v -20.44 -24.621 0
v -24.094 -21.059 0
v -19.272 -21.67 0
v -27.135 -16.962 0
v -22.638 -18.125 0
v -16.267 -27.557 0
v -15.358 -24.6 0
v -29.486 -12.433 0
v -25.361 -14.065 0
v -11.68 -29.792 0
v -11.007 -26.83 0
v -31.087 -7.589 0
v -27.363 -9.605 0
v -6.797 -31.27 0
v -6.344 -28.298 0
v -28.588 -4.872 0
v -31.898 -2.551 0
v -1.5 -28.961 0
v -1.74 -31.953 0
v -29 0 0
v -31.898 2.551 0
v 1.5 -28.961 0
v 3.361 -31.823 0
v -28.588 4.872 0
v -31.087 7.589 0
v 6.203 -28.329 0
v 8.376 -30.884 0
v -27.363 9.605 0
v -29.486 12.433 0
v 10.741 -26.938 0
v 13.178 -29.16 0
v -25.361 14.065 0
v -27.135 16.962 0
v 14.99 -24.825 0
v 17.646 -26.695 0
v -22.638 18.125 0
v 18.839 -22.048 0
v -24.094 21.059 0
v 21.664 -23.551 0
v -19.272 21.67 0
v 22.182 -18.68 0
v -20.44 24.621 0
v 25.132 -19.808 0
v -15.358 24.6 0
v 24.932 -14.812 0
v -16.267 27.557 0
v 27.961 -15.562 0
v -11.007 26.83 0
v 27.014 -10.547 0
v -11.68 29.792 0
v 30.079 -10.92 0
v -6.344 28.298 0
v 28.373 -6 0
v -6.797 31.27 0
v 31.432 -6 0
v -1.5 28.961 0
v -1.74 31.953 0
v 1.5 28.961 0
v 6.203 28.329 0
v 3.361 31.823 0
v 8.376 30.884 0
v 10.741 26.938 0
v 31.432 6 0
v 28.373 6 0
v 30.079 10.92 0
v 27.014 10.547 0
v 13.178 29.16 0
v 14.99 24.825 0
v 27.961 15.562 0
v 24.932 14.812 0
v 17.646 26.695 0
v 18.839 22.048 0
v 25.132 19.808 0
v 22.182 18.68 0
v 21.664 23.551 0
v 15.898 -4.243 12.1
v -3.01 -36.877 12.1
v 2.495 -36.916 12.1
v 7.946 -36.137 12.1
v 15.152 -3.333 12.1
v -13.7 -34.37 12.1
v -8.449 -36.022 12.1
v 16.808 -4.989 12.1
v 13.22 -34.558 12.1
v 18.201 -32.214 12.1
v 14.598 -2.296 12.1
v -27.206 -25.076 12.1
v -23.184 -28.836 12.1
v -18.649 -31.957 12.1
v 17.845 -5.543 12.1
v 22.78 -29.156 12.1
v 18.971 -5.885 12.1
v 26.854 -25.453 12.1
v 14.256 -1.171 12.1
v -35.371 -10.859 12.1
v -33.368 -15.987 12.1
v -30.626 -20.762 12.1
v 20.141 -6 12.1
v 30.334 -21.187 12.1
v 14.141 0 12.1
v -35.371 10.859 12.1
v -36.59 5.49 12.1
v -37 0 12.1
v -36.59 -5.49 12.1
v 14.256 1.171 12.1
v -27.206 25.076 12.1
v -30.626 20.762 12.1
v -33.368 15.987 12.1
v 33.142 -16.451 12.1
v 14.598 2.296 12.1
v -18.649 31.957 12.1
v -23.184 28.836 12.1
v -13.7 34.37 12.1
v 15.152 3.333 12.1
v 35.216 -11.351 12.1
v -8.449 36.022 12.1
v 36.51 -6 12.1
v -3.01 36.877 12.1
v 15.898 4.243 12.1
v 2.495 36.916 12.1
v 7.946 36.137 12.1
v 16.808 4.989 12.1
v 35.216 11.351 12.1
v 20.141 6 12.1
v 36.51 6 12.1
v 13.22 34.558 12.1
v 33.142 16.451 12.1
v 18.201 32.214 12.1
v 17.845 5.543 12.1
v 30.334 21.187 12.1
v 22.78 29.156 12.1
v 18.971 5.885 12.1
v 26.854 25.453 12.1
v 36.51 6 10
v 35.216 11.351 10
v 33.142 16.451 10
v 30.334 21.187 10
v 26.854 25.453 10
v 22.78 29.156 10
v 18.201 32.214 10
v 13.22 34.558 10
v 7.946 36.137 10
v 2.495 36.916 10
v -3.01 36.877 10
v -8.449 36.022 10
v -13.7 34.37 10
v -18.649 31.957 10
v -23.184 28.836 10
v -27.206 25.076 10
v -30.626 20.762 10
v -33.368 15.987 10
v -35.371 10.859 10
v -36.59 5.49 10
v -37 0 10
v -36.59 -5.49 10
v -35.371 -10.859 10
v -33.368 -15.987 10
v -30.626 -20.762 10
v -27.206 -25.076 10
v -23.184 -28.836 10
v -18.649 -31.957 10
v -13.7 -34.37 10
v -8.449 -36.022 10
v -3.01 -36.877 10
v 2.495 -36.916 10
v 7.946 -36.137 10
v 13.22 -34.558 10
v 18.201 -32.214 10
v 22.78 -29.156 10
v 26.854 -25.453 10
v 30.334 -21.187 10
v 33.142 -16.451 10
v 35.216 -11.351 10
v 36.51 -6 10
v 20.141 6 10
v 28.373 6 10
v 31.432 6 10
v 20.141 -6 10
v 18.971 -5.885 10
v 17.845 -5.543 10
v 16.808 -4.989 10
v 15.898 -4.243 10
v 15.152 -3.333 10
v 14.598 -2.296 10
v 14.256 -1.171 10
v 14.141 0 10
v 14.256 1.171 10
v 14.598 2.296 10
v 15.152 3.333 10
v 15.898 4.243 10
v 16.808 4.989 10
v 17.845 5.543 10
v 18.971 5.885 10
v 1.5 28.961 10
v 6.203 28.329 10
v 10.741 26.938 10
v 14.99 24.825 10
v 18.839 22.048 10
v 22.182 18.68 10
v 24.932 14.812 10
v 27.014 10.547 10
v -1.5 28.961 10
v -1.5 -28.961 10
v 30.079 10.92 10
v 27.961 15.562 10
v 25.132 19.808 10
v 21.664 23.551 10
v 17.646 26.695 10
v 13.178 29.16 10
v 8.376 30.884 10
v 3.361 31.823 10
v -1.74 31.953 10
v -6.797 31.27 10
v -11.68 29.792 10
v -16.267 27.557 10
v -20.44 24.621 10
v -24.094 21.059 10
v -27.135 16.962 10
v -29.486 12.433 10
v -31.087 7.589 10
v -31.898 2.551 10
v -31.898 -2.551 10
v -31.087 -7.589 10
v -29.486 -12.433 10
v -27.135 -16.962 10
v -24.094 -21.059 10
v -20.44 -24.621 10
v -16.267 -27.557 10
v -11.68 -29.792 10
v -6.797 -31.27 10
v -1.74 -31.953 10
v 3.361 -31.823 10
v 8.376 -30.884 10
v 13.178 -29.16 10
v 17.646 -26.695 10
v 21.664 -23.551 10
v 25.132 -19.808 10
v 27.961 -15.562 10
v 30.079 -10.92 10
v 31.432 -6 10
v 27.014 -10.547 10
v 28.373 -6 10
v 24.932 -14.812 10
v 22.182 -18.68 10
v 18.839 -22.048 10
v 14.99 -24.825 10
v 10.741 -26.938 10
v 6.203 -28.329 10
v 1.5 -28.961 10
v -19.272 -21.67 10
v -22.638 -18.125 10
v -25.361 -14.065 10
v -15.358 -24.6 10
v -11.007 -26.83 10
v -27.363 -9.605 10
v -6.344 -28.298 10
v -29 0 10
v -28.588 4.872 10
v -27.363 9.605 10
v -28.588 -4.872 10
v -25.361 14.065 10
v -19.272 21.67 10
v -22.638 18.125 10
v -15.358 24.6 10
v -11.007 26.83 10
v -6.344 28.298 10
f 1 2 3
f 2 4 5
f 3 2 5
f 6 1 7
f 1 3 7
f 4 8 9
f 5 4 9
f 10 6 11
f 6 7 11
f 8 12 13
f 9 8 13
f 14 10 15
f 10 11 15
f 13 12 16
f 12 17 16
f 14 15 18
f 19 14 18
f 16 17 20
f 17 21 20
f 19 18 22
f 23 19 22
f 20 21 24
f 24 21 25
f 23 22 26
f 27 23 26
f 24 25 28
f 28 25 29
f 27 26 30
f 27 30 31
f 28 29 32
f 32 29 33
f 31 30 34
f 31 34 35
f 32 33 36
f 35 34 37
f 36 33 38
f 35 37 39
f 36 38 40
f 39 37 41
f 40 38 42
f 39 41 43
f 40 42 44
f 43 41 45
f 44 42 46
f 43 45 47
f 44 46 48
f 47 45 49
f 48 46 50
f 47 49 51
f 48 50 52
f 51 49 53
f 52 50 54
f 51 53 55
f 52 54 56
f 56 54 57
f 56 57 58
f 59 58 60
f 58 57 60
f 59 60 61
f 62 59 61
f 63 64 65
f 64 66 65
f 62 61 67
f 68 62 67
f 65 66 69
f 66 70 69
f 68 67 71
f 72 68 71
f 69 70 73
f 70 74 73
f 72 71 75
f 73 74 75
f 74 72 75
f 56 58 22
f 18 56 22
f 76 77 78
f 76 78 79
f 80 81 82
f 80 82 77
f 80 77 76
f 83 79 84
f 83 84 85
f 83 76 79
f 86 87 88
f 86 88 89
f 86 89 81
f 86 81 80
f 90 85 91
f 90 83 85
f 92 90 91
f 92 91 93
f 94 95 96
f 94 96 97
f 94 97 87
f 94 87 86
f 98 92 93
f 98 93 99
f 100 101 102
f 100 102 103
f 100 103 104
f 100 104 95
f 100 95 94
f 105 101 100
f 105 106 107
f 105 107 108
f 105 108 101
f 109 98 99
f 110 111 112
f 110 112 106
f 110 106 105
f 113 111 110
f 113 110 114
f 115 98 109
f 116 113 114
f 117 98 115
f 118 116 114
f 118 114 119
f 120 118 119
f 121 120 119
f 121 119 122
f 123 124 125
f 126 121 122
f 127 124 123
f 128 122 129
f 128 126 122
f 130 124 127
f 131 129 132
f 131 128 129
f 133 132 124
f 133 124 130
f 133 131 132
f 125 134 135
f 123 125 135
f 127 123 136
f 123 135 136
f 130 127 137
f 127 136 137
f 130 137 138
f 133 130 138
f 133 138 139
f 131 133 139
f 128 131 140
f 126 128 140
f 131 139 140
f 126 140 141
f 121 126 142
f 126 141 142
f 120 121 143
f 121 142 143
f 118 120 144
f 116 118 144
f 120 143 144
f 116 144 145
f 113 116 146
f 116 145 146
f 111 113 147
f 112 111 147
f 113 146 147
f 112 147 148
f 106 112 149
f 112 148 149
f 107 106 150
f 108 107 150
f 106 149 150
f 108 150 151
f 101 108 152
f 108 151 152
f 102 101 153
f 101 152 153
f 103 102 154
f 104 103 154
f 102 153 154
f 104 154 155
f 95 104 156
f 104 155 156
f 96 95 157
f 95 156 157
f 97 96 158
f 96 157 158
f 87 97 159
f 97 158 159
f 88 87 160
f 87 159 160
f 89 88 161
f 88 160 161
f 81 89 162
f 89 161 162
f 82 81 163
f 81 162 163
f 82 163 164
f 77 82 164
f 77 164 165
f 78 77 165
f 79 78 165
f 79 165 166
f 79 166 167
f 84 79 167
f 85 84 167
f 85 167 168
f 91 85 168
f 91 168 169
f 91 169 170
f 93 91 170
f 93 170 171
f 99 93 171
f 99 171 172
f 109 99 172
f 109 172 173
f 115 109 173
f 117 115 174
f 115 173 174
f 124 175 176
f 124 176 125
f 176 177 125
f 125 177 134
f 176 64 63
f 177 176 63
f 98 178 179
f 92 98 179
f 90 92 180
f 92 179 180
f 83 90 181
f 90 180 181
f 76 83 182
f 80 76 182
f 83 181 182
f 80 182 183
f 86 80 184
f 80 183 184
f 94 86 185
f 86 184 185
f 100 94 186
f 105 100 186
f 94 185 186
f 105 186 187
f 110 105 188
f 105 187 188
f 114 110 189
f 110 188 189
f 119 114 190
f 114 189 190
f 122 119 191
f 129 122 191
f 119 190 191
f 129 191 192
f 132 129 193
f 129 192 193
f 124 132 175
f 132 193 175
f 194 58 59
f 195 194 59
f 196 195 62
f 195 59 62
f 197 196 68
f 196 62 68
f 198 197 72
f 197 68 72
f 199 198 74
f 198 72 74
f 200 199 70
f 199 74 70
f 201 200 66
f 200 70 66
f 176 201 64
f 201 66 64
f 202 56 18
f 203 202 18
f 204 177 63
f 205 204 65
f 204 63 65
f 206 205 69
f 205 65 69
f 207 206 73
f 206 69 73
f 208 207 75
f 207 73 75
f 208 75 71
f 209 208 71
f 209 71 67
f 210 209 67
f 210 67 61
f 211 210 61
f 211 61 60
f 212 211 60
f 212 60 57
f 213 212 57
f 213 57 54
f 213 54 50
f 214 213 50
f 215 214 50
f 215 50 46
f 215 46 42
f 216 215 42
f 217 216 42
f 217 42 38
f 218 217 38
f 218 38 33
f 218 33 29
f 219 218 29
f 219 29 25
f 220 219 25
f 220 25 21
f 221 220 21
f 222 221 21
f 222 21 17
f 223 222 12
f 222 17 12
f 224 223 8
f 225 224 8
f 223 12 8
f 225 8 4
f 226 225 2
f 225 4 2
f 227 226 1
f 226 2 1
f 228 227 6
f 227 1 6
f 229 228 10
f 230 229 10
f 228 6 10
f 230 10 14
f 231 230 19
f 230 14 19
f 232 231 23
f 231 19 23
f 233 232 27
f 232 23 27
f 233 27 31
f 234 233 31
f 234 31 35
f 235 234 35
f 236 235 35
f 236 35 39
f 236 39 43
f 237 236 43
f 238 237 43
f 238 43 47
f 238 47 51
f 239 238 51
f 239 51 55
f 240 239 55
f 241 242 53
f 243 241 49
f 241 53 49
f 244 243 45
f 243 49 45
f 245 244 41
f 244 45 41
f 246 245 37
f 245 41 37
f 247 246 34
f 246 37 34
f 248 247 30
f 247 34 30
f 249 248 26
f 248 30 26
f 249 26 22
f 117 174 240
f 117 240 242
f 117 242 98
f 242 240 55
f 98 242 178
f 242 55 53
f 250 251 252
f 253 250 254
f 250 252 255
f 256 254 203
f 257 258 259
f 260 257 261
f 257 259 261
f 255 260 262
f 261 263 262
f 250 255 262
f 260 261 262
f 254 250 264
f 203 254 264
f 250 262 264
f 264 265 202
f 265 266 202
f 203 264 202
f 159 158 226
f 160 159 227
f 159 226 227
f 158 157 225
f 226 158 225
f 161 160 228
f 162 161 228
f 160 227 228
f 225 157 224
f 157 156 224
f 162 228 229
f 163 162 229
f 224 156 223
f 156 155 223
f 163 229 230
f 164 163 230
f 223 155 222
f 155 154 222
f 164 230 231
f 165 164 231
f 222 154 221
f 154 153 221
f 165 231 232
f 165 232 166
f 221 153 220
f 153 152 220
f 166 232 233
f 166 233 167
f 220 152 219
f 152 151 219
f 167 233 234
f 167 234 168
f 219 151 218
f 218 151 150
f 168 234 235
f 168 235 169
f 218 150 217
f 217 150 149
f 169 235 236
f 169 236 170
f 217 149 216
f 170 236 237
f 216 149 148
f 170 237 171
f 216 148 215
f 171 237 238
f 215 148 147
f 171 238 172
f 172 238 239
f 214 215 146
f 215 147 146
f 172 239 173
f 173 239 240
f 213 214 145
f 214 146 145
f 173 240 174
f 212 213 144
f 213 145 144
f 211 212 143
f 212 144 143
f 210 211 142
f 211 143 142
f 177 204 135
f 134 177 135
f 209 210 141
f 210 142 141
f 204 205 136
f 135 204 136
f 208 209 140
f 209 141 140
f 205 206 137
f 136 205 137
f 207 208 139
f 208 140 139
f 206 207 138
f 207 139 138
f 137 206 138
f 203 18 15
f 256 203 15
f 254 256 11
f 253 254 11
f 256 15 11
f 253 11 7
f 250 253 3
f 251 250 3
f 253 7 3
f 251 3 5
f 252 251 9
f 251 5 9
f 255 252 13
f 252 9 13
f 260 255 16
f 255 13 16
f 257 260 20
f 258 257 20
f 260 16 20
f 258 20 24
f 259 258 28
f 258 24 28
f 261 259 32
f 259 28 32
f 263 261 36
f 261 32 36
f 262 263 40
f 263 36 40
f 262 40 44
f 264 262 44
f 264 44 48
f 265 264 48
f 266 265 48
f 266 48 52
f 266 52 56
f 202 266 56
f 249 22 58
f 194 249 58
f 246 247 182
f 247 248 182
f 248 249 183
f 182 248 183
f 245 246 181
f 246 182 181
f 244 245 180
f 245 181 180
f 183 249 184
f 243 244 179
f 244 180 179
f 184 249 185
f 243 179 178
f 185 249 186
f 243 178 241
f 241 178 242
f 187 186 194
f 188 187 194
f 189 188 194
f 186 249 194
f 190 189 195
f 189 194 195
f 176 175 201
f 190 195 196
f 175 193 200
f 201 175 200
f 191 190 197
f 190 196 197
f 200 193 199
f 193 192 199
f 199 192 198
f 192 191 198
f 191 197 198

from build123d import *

# Parameters (mm, degrees)
F0_R     = 32
F1_DEPTH = 10
F3_DEPTH = 2.1
F5_DEPTH = 25


with BuildPart() as f1:
    # F0 (on Top) → F1 (new body)
    with BuildSketch(Plane.XY):
        Circle(F0_R)
        with BuildLine():
            ThreePointArc((-1.5, -28.961181), (-29, 0), (-1.5, 28.961181))
            Line((-1.5, 28.961181), (-1.5, -28.961181))
        make_face(mode=Mode.SUBTRACT)
        with BuildLine():
            ThreePointArc((1.5, 28.961181), (29, 0), (1.5, -28.961181))
            Line((1.5, -28.961181), (1.5, 28.961181))
        make_face(mode=Mode.SUBTRACT)
    extrude(amount=F1_DEPTH)

    # F2 (on face) → F3 (join)
    with BuildSketch(Plane.XY.offset(10)):
        with BuildLine():
            Line((20.141127, 6), (36.510273, 6))
            ThreePointArc((36.510273, 6), (-37, 0), (36.510273, -6))
            Line((36.510273, -6), (20.141127, -6))
            ThreePointArc((20.141127, -6), (14.141127, 0), (20.141127, 6))
        make_face()
    extrude(amount=F3_DEPTH)

    # F4 (on face) → F5 (cut)
    with BuildSketch(Plane.XY.offset(10)):
        with BuildLine():
            Line((36.510273, 6), (20.141127, 6))
            ThreePointArc((20.141127, 6), (14.141127, 0), (20.141127, -6))
            Line((20.141127, -6), (36.510273, -6))
            Line((36.510273, -6), (36.510273, 6))
        make_face()
    extrude(amount=-F5_DEPTH, mode=Mode.SUBTRACT)


solid = f1.part
